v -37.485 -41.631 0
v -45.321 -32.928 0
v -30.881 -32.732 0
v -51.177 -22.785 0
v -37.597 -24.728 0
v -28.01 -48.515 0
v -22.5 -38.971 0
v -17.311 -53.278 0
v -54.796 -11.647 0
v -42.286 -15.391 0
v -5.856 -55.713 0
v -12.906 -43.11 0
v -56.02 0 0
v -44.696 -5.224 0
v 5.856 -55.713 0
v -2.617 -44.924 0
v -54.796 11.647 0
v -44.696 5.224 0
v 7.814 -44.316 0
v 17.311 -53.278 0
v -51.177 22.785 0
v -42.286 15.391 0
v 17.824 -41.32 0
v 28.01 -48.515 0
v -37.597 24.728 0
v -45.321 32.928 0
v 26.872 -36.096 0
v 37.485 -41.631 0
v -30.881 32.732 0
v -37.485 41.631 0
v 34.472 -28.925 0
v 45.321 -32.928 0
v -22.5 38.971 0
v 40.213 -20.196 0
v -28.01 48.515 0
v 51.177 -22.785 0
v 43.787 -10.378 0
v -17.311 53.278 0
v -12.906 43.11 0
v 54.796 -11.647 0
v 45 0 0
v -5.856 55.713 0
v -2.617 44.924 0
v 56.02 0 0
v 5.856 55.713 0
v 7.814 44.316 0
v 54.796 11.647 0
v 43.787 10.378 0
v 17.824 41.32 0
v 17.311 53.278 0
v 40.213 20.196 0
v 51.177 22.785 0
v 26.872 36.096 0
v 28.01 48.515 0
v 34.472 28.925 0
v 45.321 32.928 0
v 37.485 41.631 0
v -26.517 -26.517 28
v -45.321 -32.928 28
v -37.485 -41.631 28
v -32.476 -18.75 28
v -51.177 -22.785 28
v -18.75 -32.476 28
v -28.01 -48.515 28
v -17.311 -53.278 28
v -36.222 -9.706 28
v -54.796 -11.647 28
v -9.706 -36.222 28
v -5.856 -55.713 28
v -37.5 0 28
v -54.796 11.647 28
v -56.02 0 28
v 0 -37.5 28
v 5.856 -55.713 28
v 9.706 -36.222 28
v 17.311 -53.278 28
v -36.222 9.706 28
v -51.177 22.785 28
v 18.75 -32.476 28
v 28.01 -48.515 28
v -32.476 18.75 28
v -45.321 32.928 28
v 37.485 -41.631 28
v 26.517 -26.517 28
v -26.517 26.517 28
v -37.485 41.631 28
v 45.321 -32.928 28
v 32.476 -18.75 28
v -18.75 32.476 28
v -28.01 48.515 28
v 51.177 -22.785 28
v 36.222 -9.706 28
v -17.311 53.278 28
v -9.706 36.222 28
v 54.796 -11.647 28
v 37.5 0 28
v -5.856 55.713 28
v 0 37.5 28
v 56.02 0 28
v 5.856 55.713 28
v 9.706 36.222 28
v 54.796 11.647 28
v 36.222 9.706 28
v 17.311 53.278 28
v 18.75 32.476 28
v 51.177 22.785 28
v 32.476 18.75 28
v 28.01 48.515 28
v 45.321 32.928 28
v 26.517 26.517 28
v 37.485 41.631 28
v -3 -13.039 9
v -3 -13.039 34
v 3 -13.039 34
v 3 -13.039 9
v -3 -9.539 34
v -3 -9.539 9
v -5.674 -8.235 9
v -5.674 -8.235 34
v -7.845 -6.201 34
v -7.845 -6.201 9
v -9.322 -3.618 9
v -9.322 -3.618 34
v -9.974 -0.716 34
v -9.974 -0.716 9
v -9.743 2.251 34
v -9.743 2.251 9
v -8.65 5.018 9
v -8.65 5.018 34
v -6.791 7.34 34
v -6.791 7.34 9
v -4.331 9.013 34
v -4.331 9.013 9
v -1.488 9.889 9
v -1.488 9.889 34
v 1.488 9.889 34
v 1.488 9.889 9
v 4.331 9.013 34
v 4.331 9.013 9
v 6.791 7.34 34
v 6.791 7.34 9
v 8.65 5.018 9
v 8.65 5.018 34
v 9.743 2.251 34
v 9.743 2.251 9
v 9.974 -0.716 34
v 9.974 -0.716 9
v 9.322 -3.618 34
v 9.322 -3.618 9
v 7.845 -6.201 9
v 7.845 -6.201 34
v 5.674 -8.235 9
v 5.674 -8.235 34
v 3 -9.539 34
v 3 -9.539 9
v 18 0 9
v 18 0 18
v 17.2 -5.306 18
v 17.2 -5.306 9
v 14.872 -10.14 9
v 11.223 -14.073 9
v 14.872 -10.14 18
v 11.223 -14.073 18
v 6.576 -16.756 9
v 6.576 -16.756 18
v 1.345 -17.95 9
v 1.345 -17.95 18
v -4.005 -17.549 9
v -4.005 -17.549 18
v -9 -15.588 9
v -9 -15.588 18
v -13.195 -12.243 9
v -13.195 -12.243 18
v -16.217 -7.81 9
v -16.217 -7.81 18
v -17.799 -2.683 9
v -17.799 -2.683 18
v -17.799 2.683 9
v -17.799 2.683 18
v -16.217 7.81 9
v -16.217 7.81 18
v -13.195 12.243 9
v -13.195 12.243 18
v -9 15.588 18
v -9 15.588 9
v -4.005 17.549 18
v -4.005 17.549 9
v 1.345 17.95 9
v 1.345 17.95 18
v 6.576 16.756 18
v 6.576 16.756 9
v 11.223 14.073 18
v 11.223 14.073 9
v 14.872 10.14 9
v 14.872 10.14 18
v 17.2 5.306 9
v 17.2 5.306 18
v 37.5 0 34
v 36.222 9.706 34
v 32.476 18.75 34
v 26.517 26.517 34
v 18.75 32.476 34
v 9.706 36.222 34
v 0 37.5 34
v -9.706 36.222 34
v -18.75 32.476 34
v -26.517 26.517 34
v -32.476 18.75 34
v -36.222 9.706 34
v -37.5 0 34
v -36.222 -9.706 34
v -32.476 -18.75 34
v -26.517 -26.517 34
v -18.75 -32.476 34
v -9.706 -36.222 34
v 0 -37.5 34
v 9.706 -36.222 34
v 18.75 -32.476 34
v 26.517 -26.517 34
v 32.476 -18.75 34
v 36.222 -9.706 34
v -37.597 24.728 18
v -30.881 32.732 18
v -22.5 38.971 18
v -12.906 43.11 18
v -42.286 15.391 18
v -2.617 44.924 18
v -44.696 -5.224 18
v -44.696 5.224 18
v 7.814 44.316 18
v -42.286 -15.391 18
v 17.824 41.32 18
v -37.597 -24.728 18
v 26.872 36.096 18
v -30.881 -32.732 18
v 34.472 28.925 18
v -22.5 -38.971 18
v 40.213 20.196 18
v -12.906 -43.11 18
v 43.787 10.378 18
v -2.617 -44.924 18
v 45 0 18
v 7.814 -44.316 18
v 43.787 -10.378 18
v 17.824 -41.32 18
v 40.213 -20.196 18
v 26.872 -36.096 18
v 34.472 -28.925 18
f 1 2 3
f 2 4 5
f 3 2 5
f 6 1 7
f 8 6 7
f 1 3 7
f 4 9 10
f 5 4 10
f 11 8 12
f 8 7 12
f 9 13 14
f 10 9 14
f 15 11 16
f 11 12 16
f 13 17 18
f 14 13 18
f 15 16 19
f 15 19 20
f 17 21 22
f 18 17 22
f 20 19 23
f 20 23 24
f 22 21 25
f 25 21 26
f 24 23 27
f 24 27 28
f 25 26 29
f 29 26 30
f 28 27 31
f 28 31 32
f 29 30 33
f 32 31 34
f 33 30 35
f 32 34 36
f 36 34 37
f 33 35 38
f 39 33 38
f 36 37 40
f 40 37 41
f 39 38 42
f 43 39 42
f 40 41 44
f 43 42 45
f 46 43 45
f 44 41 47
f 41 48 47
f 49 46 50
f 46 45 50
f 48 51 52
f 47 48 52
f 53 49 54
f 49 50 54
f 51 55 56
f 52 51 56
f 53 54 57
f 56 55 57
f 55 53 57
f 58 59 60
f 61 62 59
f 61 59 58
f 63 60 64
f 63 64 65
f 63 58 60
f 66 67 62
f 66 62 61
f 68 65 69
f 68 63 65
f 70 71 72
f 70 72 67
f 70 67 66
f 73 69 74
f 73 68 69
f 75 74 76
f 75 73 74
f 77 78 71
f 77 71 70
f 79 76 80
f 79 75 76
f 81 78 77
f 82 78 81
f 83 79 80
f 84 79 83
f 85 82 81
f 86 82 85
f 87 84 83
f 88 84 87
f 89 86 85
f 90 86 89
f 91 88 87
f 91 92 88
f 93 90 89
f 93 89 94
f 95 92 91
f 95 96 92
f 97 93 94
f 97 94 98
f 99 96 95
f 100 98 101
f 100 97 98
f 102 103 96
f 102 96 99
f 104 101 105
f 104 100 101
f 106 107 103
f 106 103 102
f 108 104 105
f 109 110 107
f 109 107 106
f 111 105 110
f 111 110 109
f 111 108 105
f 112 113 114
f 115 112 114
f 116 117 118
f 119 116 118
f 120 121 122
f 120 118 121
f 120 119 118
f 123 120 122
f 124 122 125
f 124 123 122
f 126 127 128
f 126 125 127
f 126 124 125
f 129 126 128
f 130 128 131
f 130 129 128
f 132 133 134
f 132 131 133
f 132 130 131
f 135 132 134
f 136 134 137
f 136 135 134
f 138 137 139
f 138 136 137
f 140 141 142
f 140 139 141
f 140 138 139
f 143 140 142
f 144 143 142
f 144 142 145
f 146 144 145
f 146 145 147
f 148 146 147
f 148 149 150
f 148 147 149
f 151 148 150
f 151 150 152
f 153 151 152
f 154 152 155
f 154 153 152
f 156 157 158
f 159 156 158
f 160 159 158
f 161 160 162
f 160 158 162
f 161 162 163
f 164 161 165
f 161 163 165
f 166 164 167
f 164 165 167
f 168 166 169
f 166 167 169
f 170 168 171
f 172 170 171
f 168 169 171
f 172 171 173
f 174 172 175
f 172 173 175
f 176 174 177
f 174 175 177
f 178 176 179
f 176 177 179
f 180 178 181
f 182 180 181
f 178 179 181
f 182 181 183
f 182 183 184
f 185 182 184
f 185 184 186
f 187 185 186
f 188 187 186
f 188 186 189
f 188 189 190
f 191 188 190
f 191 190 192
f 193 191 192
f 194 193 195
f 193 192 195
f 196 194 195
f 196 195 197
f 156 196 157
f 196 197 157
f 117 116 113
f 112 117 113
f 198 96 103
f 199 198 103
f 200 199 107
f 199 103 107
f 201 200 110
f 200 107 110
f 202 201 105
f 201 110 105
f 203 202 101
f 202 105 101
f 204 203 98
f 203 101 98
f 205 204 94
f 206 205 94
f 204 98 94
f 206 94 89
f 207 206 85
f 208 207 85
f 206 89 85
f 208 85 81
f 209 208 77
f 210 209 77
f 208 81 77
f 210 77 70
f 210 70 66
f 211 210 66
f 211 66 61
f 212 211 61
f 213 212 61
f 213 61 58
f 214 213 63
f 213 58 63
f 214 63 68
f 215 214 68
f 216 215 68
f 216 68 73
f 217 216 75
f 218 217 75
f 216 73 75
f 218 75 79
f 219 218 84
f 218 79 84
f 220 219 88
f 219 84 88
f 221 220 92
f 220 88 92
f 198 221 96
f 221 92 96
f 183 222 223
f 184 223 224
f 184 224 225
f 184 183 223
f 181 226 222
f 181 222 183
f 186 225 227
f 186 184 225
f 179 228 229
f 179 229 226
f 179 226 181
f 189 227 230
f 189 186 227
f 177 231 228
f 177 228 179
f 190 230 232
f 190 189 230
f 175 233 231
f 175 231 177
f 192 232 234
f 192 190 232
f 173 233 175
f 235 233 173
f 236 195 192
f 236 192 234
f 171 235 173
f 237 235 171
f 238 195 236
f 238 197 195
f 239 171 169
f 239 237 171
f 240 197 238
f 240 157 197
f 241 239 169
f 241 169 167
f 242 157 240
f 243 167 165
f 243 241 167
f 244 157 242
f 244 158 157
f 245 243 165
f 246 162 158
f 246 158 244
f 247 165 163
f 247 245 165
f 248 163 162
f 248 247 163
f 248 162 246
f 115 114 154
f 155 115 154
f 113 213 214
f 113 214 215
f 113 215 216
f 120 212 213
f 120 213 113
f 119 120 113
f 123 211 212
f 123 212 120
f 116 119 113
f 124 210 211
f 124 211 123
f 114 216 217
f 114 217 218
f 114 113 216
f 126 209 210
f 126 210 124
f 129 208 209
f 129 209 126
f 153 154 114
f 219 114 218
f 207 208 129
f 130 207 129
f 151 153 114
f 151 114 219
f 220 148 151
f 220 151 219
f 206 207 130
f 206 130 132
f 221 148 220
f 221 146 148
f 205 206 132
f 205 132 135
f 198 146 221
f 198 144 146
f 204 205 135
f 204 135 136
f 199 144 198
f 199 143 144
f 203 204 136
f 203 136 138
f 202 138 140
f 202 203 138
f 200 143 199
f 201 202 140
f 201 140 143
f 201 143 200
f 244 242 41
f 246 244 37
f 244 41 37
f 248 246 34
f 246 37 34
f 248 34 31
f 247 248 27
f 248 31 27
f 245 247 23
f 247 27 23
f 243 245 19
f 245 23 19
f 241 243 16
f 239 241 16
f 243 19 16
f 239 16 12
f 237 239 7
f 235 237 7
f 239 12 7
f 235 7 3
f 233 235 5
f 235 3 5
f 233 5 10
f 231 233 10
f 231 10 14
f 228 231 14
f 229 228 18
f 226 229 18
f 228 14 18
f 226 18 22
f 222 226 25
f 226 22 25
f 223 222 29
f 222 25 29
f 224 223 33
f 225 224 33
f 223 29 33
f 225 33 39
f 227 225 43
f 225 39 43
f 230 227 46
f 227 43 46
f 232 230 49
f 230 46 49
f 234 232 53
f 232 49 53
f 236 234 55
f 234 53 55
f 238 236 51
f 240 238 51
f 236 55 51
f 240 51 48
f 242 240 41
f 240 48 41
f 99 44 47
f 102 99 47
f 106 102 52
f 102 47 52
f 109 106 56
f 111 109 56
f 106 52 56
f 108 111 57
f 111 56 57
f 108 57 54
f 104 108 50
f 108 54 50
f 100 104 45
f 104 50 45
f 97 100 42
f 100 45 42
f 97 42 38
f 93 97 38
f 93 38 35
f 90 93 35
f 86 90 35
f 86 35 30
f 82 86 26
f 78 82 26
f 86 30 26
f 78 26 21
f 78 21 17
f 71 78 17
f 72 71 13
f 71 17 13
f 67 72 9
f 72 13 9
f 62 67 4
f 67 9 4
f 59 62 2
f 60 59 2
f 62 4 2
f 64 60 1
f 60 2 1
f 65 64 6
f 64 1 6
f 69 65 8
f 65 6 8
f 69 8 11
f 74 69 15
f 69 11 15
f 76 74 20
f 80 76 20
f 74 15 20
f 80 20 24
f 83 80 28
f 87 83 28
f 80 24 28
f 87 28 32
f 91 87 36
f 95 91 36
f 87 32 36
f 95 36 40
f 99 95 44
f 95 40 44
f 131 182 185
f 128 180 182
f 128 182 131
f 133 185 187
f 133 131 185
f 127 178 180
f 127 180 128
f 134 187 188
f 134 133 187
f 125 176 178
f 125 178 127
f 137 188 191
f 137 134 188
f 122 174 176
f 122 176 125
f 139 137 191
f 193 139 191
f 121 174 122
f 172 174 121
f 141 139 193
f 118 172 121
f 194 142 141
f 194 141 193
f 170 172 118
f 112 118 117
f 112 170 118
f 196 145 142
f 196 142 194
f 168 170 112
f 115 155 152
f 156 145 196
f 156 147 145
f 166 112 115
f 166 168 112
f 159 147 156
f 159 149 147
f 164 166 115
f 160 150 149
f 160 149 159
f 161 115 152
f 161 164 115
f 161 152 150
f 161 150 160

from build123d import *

# Parameters (mm, degrees)
F0_R     = 56.02
F0_R_2   = 10
F1_DEPTH = 28
F2_R     = 37.5
F2_R_2   = 10
F3_DEPTH = 6
F4_R     = 45
F4_R_2   = 10
F5_DEPTH = 18
F6_R     = 18
F6_R_2   = 10
F7_DEPTH = 9
F9_DEPTH = 25


with BuildPart() as f1:
    # F0 (on Top) → F1 (new body)
    with BuildSketch(Plane.XY):
        Circle(F0_R)
        Circle(F0_R_2, mode=Mode.SUBTRACT)
    extrude(amount=F1_DEPTH)

    # F2 (on face) → F3 (join)
    with BuildSketch(Plane.XY.offset(28)):
        Circle(F2_R)
        Circle(F2_R_2, mode=Mode.SUBTRACT)
    extrude(amount=F3_DEPTH)

    # F4 (on face) → F5 (cut)
    with BuildSketch(Plane(origin=(0, 0, 0), x_dir=(1, 0, 0), z_dir=(0, 0, -1))):
        Circle(F4_R)
        Circle(F4_R_2, mode=Mode.SUBTRACT)
    extrude(amount=-F5_DEPTH, mode=Mode.SUBTRACT)

    # F6 (on face) → F7 (join)
    with BuildSketch(Plane(origin=(0, 0, 18), x_dir=(1, 0, 0), z_dir=(0, 0, -1))):
        Circle(F6_R)
        Circle(F6_R_2, mode=Mode.SUBTRACT)
    extrude(amount=F7_DEPTH)

    # F8 (on face) → F9 (cut)
    with BuildSketch(Plane.XY.offset(34)):
        with BuildLine():
            ThreePointArc((3, -9.5393920142), (0, -10), (-3, -9.5393920142))
            Line((-3, -9.5393920142), (-3, -13.0393920142))
            Line((-3, -13.0393920142), (3, -13.0393920142))
            Line((3, -13.0393920142), (3, -9.5393920142))
        make_face()
    extrude(amount=-F9_DEPTH, mode=Mode.SUBTRACT)


solid = f1.part
